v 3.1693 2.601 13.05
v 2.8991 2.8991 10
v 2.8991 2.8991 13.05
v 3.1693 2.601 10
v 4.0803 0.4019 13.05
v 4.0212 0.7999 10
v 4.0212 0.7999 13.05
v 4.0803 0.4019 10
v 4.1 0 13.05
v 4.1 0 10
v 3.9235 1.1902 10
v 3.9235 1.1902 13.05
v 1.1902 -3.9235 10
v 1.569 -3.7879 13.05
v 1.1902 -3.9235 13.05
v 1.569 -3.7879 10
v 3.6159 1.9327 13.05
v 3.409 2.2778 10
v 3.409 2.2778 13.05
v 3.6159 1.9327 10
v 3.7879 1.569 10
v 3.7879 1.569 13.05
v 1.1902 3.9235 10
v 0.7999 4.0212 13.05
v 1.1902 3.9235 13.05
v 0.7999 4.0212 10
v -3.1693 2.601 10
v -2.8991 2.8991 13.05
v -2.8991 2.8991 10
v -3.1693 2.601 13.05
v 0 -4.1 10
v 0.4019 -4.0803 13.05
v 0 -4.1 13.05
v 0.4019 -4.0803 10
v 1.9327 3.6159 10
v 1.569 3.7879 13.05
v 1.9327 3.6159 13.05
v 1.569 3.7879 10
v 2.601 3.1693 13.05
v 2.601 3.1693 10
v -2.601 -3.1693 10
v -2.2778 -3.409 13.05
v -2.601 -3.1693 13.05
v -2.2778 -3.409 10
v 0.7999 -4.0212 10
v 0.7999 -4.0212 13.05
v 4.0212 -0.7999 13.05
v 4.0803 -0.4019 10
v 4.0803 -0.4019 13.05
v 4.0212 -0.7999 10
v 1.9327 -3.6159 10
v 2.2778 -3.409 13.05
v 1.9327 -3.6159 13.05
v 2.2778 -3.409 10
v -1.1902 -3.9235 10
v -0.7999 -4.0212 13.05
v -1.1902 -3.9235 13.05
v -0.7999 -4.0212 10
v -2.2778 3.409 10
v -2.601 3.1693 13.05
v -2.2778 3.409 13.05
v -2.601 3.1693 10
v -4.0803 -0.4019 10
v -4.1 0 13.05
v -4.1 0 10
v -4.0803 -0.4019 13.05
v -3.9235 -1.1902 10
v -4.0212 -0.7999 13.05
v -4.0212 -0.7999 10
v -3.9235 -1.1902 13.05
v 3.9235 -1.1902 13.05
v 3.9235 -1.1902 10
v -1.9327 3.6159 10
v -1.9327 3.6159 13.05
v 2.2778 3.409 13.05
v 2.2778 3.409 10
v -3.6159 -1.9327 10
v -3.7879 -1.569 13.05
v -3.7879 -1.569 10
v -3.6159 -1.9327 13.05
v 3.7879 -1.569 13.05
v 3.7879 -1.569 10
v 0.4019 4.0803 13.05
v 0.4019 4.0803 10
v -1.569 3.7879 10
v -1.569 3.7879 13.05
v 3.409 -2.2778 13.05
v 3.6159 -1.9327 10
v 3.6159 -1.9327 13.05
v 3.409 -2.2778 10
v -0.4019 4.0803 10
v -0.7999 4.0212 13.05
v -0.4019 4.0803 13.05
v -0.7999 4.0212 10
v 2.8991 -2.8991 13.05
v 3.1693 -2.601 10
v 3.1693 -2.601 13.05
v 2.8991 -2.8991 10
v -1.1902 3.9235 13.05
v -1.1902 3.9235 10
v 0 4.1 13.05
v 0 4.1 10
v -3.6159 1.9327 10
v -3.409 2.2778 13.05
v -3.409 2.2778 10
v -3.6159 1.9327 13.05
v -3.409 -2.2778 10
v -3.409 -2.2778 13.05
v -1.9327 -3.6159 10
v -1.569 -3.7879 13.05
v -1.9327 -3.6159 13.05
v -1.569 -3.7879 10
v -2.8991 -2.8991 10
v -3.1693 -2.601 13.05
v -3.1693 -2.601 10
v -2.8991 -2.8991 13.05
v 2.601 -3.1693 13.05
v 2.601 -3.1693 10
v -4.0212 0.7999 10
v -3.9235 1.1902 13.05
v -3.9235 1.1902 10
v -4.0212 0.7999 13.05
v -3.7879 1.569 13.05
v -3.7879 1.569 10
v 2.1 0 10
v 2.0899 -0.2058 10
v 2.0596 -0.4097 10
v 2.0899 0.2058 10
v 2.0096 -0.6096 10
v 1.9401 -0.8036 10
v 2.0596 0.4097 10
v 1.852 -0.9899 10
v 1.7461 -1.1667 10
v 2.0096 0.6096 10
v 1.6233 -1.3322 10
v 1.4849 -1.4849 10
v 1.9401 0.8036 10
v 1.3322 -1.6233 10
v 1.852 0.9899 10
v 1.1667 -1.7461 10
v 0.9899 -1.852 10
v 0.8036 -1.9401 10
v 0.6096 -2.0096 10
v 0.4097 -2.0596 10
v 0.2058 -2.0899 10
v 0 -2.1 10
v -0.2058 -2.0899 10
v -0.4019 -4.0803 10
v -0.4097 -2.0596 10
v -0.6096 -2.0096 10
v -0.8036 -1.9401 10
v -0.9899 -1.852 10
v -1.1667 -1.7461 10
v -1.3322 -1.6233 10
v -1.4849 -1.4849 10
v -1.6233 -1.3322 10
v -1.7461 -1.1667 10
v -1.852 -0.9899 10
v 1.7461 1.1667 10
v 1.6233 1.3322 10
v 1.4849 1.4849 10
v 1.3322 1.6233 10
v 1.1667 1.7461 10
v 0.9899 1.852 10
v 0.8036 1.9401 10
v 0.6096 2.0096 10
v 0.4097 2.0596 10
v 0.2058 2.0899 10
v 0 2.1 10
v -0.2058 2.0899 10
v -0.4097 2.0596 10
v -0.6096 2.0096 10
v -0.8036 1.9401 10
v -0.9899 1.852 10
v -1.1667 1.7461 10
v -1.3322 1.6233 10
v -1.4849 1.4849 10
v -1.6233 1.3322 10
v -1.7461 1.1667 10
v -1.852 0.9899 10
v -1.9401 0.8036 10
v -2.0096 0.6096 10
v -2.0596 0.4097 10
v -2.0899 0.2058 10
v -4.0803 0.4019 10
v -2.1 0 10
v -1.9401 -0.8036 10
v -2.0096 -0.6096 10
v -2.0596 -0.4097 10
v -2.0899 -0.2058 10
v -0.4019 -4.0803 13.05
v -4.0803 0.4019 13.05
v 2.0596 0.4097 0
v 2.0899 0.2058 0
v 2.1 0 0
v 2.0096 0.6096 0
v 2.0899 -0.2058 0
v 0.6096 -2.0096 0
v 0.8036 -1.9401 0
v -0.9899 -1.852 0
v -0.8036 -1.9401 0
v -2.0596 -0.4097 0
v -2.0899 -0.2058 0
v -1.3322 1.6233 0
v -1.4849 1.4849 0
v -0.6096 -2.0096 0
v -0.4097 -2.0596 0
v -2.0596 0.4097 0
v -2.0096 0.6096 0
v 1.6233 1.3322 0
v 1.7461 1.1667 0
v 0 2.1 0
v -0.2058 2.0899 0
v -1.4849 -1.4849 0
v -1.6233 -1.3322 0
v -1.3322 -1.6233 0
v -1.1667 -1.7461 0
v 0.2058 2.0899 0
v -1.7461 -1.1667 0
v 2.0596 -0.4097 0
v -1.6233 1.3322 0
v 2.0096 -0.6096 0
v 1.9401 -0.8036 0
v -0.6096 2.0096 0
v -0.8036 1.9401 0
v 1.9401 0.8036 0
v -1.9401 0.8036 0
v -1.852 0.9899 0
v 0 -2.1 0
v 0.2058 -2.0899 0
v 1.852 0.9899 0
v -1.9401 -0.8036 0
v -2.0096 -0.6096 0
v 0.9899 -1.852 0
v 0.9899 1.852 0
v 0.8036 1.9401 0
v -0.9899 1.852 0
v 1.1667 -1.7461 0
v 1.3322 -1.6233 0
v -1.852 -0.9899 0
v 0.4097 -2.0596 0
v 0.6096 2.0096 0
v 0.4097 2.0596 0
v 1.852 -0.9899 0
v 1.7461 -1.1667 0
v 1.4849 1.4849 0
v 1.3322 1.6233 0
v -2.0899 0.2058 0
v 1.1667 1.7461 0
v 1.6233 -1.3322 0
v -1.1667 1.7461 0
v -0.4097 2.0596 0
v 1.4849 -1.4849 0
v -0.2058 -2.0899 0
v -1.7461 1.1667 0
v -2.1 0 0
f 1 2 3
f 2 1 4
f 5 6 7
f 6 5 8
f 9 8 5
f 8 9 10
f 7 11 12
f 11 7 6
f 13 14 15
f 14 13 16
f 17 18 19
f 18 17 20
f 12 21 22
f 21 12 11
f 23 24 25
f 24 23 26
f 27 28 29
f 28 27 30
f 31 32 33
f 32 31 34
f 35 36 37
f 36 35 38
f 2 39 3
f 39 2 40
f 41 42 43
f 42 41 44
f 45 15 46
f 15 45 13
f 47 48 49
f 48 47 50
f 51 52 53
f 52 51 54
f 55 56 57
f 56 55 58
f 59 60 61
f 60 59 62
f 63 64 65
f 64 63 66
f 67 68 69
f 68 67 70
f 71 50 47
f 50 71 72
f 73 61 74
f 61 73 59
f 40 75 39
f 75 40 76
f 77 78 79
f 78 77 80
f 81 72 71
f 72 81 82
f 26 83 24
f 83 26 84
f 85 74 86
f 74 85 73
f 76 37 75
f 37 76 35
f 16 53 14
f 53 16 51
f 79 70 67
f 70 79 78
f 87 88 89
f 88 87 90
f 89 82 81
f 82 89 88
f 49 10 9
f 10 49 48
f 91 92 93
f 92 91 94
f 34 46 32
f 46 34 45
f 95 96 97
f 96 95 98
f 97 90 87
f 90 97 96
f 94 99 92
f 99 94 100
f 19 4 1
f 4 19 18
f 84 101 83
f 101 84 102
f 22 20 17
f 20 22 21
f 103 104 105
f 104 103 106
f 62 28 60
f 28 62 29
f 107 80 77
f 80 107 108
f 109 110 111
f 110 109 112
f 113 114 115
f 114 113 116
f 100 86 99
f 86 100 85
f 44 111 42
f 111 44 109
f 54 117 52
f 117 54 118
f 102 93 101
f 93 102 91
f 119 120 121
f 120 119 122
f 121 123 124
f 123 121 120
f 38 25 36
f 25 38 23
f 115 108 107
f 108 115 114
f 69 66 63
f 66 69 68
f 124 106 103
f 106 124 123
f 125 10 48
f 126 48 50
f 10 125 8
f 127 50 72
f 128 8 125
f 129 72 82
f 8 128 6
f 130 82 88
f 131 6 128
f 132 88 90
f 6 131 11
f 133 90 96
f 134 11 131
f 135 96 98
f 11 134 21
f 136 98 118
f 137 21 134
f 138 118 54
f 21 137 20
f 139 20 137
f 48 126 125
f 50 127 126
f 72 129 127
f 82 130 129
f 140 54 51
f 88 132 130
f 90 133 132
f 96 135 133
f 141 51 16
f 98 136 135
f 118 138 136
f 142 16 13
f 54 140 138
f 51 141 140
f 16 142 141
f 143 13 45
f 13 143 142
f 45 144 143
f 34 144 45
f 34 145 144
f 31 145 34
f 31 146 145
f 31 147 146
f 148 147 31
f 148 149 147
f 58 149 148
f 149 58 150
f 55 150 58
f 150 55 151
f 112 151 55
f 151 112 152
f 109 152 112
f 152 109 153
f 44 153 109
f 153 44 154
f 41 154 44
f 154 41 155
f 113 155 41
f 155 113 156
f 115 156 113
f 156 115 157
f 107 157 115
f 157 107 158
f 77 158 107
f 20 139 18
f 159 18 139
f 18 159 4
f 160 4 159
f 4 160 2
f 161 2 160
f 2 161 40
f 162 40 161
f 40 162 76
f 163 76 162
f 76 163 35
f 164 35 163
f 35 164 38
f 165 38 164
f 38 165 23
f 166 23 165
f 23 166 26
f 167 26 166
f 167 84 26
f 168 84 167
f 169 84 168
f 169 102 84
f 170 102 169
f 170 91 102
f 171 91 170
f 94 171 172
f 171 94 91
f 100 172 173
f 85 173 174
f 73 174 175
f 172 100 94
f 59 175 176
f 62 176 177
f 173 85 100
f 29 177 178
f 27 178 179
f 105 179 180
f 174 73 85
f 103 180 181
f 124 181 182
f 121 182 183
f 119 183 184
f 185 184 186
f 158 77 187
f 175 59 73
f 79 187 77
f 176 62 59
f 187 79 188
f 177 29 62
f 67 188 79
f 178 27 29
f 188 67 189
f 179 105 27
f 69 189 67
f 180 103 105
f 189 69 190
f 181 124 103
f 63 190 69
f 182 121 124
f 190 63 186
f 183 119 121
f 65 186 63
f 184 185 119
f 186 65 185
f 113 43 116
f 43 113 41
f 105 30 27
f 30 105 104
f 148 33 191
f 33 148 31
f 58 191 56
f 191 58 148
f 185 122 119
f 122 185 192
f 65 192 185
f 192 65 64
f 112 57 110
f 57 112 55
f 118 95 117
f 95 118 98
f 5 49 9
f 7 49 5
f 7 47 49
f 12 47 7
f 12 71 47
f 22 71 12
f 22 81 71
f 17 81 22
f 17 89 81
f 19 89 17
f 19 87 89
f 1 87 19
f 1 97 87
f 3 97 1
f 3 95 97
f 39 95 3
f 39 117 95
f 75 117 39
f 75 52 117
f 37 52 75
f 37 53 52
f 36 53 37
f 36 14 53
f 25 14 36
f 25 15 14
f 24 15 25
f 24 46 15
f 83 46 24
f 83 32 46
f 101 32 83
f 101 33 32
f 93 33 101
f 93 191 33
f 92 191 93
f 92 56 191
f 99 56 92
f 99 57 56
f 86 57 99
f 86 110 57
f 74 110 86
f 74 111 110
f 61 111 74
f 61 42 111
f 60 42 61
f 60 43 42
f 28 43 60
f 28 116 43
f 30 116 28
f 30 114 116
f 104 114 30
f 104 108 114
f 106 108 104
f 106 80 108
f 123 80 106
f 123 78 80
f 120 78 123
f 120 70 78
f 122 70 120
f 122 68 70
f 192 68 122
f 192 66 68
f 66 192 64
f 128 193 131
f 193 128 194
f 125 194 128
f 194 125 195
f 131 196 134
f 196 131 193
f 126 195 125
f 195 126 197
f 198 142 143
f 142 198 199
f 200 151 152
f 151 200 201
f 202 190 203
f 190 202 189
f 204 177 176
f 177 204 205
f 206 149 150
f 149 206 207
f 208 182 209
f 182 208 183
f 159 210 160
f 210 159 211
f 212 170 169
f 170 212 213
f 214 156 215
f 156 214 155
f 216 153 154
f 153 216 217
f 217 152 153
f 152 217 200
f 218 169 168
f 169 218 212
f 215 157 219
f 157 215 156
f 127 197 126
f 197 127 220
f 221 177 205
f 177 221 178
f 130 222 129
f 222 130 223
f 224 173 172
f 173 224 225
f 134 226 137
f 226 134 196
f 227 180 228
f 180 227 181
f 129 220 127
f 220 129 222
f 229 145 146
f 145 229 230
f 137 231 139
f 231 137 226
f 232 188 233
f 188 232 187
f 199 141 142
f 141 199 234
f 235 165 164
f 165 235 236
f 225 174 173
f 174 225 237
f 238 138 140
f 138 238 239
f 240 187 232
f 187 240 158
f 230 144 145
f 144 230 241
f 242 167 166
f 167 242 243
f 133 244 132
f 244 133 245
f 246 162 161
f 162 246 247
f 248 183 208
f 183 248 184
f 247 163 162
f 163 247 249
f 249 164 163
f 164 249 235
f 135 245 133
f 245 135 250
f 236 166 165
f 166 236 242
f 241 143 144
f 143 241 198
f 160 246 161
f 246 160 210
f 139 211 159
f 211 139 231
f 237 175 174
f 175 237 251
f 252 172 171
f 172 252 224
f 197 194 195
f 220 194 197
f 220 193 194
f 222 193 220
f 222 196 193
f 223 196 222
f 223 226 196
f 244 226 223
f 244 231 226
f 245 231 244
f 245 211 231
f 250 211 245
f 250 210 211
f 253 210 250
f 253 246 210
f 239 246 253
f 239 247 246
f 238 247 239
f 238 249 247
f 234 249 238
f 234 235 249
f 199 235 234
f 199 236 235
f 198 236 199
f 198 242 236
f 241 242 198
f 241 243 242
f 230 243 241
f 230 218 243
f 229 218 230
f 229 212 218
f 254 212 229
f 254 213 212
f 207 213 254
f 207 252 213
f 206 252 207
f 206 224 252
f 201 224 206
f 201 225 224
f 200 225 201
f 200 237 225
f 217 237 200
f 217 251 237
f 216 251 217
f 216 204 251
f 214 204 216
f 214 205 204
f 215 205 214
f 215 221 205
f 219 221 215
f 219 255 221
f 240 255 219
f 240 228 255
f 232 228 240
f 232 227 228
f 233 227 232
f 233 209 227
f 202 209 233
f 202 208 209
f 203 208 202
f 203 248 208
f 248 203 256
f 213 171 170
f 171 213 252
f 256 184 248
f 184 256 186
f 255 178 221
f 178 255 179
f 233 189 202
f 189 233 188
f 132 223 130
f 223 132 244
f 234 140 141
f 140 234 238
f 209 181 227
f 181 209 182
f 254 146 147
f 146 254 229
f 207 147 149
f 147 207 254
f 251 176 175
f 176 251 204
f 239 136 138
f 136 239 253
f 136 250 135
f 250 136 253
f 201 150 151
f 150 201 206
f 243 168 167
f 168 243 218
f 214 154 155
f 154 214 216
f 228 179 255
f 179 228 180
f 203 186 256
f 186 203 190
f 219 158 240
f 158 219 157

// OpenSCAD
module pan_head_screw() {
    union() {
        // Screw head
        translate([0, 0, 10])
            cylinder(h = 3.05, d = 8.2, $fn = 64);
        
        // Screw body
        cylinder(h = 10, d = 4.2, $fn = 64);
    }
}

pan_head_screw();
